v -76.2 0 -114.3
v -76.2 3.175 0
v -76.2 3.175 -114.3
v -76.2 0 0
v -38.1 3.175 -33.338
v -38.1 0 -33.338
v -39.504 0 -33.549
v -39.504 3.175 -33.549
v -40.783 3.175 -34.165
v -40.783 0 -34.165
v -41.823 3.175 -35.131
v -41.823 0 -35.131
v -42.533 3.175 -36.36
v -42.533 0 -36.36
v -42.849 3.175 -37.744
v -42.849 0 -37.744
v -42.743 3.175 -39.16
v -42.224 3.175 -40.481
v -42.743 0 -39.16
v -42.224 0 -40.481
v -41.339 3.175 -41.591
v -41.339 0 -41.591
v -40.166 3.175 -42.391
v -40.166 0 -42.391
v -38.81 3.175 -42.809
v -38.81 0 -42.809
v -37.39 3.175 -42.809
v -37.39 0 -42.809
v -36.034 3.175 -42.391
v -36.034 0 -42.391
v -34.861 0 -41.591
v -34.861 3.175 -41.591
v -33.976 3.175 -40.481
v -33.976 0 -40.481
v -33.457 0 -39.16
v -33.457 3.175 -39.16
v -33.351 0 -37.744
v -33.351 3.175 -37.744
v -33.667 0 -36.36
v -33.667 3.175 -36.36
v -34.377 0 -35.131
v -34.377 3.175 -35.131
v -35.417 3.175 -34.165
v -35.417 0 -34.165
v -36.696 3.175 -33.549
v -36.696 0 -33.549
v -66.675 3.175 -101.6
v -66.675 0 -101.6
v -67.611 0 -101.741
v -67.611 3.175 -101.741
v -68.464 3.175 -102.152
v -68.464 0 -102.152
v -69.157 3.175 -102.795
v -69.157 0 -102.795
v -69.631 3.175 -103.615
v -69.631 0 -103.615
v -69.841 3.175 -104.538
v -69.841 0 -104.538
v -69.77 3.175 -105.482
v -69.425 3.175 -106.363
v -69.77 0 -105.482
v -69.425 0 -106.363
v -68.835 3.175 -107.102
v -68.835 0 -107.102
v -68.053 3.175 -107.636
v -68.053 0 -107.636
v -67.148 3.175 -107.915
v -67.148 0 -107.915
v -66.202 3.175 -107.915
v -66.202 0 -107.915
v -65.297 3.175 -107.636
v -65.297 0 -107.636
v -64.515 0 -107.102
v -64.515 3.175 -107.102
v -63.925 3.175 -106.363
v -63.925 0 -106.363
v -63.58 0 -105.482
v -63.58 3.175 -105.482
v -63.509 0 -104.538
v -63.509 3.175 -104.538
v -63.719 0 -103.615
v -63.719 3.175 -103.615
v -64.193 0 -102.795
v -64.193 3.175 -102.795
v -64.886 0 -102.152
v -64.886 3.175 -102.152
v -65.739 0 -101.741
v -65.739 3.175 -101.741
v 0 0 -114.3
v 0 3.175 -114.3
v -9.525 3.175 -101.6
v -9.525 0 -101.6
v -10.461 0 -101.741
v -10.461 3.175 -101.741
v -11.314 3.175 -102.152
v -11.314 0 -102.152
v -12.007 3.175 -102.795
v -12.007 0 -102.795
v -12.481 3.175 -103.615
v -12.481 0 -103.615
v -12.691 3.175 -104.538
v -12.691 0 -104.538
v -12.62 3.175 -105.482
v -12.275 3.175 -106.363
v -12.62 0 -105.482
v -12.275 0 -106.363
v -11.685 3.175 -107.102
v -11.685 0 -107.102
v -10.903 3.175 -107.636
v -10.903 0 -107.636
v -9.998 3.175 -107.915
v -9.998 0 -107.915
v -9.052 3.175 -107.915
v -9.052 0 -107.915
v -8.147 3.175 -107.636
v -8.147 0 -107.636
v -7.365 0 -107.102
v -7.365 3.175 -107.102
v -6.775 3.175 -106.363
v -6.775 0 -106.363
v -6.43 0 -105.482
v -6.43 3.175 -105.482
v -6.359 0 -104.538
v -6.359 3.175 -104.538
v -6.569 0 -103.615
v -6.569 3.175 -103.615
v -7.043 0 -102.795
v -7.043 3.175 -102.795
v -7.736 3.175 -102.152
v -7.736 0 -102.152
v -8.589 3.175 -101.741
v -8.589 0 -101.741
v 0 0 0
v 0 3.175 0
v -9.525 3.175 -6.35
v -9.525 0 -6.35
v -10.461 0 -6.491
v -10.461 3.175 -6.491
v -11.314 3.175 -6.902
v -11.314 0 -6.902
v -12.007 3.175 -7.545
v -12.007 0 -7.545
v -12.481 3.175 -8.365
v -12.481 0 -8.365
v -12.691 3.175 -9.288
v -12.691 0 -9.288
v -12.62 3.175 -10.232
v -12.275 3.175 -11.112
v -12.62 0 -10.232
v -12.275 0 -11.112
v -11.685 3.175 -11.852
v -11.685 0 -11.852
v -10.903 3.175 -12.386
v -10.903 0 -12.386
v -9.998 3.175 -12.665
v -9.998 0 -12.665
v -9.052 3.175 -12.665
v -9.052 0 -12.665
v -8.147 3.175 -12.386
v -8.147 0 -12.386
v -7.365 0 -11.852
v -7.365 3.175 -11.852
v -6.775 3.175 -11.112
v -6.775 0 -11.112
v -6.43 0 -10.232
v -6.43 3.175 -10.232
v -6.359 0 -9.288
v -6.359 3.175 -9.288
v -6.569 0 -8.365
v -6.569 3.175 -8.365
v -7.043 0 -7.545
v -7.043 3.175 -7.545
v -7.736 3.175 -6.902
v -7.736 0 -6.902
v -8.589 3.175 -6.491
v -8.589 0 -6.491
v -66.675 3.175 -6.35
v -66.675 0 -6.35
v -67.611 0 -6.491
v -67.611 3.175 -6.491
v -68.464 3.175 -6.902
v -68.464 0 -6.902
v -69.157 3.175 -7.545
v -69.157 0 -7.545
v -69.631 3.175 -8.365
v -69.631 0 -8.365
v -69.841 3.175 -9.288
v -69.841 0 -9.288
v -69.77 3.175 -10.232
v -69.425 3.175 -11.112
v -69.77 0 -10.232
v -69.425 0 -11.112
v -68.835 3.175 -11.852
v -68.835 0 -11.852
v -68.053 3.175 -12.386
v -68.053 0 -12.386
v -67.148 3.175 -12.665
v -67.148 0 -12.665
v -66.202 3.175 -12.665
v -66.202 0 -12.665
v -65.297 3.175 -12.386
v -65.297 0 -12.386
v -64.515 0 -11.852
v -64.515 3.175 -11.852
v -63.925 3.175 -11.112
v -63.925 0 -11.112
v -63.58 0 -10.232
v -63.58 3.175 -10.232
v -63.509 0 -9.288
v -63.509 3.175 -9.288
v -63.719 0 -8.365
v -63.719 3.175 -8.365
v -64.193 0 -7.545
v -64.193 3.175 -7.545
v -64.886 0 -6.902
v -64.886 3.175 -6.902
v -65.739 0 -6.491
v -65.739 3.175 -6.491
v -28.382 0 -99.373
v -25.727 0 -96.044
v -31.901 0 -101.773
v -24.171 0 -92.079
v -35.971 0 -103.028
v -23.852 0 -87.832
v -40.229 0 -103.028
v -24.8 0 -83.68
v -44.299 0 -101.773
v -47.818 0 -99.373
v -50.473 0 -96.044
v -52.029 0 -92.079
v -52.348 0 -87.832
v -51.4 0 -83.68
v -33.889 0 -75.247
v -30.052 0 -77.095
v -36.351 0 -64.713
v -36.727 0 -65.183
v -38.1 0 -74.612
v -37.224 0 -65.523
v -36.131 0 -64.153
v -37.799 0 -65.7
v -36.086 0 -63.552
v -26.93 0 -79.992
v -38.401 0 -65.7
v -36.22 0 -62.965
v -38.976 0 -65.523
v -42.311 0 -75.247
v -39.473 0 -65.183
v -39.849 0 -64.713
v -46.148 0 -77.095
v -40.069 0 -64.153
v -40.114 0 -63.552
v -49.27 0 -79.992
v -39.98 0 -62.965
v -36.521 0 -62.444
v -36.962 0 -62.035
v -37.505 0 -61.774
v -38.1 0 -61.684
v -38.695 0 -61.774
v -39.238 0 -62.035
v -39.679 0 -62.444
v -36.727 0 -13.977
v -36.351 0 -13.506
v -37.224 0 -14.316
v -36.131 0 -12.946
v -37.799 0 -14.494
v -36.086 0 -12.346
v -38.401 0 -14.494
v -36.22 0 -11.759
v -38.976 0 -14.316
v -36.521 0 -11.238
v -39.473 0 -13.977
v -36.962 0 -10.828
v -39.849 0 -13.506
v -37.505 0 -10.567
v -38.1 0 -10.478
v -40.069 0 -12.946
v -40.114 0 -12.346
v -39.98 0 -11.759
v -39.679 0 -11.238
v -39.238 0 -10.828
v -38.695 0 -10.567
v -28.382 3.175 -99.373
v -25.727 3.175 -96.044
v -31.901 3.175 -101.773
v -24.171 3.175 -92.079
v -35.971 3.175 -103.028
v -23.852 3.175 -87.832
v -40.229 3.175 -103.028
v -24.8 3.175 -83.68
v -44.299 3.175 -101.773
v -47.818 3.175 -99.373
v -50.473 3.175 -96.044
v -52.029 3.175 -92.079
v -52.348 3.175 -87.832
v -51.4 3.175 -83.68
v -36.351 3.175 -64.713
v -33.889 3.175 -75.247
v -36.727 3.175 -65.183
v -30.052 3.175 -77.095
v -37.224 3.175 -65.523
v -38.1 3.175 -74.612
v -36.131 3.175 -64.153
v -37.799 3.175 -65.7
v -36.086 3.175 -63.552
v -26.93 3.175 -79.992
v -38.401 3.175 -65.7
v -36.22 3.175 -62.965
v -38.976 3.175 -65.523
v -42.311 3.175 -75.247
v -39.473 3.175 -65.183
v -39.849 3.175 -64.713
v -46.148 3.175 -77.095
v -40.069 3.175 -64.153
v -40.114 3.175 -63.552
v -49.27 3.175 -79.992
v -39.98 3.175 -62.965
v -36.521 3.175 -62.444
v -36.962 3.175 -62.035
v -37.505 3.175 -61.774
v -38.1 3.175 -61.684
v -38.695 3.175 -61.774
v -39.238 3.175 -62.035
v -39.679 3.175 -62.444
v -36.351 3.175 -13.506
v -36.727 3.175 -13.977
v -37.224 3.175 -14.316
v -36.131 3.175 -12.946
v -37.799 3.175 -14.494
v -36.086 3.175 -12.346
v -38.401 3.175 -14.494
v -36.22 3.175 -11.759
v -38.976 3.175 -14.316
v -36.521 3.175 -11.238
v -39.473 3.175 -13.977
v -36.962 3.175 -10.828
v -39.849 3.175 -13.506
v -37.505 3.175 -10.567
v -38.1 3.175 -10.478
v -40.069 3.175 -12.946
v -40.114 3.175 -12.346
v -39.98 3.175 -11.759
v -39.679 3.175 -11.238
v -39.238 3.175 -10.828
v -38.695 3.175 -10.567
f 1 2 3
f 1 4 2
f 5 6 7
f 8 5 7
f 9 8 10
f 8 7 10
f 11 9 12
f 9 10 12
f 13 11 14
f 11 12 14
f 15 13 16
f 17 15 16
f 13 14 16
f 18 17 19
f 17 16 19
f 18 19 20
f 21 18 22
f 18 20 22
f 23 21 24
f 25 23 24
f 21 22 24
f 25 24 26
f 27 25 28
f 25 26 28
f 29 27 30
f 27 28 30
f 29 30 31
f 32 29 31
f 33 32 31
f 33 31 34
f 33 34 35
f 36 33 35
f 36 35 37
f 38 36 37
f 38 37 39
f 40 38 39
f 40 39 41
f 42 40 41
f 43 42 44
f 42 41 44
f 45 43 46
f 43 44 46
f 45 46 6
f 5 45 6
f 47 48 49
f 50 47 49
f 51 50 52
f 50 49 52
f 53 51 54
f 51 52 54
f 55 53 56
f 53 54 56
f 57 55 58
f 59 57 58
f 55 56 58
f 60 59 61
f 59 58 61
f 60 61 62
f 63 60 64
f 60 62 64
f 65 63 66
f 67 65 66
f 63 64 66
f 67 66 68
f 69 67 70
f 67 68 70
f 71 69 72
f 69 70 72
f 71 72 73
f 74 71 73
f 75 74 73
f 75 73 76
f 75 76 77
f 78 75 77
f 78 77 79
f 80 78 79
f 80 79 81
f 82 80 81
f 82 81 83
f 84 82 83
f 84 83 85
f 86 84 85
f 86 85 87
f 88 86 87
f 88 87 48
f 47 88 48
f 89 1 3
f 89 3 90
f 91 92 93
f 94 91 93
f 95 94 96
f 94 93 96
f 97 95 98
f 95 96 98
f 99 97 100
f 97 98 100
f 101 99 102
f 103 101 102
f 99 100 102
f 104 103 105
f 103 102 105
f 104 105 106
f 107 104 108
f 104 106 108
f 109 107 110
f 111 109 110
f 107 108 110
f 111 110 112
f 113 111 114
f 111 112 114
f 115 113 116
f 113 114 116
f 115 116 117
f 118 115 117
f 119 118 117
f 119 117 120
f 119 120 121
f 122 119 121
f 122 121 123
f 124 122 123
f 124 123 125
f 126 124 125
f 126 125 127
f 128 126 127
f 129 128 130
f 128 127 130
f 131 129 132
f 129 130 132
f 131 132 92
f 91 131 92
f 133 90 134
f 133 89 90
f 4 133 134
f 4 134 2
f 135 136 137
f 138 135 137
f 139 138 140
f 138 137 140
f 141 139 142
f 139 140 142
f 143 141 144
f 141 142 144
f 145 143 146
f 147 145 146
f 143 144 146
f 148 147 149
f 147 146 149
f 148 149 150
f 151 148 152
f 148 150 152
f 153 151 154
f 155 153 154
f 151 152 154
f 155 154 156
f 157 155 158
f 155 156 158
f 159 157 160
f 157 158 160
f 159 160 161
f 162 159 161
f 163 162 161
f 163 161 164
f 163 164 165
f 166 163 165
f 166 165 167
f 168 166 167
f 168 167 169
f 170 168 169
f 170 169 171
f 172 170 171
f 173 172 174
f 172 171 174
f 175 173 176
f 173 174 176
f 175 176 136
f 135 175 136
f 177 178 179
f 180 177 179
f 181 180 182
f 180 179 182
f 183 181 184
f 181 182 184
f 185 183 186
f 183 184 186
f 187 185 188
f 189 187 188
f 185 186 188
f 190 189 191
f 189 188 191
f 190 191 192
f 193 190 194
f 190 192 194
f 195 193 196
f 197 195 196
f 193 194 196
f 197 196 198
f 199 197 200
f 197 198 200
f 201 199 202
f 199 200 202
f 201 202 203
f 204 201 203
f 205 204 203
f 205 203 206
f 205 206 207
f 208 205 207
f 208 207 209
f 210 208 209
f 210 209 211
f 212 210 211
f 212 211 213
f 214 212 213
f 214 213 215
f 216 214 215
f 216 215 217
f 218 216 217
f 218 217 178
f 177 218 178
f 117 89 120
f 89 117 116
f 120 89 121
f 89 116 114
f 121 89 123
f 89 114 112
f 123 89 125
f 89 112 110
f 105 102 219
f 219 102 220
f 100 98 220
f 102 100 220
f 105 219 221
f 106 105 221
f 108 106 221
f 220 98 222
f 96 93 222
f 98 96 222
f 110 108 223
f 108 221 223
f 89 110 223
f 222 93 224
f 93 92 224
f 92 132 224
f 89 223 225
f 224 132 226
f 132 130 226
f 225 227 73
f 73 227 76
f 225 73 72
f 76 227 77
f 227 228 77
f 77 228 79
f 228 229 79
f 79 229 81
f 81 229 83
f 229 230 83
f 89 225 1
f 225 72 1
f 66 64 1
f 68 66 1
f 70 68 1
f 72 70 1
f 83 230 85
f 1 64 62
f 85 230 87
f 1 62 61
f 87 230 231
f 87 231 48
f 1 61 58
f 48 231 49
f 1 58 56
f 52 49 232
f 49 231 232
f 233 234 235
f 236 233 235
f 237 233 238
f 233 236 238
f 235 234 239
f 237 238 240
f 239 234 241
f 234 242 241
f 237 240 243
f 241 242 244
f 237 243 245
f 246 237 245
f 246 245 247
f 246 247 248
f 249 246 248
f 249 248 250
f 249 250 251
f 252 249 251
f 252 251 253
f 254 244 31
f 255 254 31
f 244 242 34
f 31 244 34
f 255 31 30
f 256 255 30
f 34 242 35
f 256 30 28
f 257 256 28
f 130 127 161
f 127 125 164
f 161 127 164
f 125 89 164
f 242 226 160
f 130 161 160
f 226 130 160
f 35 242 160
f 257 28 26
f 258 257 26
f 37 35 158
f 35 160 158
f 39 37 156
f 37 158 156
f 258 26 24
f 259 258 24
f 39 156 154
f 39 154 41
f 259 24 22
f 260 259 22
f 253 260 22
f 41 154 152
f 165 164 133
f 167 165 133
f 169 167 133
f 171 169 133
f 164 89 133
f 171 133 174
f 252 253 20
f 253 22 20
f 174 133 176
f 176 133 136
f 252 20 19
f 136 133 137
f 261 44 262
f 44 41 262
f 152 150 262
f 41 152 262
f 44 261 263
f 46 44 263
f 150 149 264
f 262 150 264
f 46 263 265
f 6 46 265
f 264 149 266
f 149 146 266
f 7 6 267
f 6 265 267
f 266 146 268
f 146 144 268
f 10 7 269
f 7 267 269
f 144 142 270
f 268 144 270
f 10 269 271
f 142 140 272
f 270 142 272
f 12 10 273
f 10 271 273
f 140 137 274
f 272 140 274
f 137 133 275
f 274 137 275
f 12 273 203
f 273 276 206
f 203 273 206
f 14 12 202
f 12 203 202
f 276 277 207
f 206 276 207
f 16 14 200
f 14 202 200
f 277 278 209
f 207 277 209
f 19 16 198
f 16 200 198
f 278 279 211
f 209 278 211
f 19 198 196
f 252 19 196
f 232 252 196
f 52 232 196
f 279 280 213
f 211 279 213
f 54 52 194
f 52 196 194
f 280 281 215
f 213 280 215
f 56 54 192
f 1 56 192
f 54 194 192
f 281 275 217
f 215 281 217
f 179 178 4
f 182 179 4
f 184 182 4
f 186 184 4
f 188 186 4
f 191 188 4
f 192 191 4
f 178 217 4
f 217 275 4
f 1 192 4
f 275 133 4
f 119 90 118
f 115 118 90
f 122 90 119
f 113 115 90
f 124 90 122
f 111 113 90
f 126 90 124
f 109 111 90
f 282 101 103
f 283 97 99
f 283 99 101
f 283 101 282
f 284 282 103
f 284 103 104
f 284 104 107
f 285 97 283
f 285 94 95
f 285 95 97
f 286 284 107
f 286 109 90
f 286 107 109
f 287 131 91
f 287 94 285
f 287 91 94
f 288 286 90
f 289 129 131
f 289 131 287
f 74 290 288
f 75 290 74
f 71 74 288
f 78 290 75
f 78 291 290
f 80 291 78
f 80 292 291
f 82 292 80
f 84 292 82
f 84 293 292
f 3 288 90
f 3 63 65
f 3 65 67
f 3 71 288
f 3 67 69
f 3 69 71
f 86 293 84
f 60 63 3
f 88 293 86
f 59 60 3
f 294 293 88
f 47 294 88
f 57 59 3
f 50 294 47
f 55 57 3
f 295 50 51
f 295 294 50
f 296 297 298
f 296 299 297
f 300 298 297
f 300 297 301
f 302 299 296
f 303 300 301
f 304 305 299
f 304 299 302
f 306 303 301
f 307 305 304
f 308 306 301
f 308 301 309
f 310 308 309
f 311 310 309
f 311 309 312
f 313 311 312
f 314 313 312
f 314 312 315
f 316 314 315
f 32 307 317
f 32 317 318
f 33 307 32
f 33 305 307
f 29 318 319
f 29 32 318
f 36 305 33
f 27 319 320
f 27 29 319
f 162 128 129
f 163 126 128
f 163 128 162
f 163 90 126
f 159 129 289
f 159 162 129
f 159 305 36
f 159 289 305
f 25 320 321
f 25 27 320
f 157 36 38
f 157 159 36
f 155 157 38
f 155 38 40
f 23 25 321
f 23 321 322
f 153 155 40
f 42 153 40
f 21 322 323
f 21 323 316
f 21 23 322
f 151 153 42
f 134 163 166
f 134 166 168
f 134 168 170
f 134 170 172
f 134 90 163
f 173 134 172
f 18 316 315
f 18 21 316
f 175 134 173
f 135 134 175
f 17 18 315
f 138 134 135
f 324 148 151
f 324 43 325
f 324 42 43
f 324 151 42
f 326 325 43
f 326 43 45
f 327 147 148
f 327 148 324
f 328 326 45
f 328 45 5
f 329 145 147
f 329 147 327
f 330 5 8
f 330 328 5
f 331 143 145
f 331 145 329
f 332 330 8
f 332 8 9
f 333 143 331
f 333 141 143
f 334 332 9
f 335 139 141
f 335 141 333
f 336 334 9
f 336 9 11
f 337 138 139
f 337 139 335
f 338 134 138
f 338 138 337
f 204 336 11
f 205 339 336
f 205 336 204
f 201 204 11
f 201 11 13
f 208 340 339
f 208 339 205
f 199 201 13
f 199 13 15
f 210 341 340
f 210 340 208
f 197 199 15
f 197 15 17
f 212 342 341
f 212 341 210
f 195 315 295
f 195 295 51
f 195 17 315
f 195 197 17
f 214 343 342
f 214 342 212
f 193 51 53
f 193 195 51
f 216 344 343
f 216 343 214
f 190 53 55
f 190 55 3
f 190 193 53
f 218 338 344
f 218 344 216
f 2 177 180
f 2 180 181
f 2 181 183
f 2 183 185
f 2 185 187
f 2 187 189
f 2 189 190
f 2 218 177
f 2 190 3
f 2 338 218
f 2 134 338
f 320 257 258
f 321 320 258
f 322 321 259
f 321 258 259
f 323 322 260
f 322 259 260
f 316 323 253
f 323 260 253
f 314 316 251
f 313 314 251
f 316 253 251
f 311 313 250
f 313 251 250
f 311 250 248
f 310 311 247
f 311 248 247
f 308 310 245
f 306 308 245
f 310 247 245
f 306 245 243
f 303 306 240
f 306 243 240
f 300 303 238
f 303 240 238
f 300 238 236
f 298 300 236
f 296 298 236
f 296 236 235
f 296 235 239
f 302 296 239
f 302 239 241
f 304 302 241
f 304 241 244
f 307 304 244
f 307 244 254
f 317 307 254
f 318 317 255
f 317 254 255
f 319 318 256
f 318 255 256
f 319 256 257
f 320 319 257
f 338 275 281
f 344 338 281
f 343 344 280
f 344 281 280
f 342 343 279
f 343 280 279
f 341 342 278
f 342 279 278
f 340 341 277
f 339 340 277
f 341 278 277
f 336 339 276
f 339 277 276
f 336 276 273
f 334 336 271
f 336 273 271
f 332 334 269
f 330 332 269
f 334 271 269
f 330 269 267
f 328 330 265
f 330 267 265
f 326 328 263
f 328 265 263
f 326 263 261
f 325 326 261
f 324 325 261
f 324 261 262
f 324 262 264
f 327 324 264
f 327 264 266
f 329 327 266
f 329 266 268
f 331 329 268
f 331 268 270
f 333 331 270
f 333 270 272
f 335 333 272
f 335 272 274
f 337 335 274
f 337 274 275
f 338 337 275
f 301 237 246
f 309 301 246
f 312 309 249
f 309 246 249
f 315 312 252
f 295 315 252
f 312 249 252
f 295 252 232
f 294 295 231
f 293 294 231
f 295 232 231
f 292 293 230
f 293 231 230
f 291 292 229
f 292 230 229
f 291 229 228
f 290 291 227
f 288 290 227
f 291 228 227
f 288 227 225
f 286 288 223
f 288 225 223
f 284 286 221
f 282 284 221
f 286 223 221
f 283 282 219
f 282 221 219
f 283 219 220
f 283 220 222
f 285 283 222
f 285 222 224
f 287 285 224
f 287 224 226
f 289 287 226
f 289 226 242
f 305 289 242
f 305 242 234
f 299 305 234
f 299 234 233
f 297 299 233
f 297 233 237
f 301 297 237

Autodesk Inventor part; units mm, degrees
ref_plane "YZ Plane" through (0, 0, 0) normal (1, 0, 0) x (0, 1, 0)
ref_plane "XZ Plane" through (0, 0, 0) normal (0, 1, 0) x (-1, 0, 0)
ref_plane "XY Plane" through (0, 0, 0) normal (0, 0, 1) x (1, 0, 0)
sketch "Sketch1" plane through (0, 0, 0) normal (0, 1, 0) x (-1, 0, 0)
  line L0 (0, 0) -> (76.2, 0)
  line L1 (76.2, 0) -> (76.2, -114.3)
  line L2 (76.2, -114.3) -> (0, -114.3)
  line L3 (0, -114.3) -> (0, 0)
  dimension "d0" = 76.2
  dimension "d1" = 114.3
extrude "Extrusion1" add sketch "Sketch1" along normal blind 3.175
hole "Hole1" at (-9.525, 3.175, -9.525) direction (0, -1, 0) diameter 6.35 depth 25.4 tip angle 118
hole "Hole2" at (-9.525, 3.175, -104.775) direction (0, -1, 0) diameter 6.35 depth 25.4 tip angle 118
hole "Hole3" at (-66.675, 3.175, -104.775) direction (0, -1, 0) diameter 6.35 depth 25.4 tip angle 118
hole "Hole4" at (-66.675, 3.175, -9.525) direction (0, -1, 0) diameter 6.35 depth 25.4 tip angle 118
hole "Hole5" at (-38.1, 3.175, -88.9) direction (0, -1, 0) diameter 28.575 depth 25.4 tip angle 118
hole "Hole6" at (-38.1, 3.175, -38.1) direction (0, -1, 0) diameter 9.525 depth 25.4 tip angle 118
hole "Hole7" at (-38.1, 3.175, -12.4968) direction (0, -1, 0) diameter 4.0386 depth 25.4 tip angle 118
hole "Hole8" at (-38.1, 3.175, -63.7032) direction (0, -1, 0) diameter 4.0386 depth 25.4 tip angle 118
properties part number "Gearbox plate"
